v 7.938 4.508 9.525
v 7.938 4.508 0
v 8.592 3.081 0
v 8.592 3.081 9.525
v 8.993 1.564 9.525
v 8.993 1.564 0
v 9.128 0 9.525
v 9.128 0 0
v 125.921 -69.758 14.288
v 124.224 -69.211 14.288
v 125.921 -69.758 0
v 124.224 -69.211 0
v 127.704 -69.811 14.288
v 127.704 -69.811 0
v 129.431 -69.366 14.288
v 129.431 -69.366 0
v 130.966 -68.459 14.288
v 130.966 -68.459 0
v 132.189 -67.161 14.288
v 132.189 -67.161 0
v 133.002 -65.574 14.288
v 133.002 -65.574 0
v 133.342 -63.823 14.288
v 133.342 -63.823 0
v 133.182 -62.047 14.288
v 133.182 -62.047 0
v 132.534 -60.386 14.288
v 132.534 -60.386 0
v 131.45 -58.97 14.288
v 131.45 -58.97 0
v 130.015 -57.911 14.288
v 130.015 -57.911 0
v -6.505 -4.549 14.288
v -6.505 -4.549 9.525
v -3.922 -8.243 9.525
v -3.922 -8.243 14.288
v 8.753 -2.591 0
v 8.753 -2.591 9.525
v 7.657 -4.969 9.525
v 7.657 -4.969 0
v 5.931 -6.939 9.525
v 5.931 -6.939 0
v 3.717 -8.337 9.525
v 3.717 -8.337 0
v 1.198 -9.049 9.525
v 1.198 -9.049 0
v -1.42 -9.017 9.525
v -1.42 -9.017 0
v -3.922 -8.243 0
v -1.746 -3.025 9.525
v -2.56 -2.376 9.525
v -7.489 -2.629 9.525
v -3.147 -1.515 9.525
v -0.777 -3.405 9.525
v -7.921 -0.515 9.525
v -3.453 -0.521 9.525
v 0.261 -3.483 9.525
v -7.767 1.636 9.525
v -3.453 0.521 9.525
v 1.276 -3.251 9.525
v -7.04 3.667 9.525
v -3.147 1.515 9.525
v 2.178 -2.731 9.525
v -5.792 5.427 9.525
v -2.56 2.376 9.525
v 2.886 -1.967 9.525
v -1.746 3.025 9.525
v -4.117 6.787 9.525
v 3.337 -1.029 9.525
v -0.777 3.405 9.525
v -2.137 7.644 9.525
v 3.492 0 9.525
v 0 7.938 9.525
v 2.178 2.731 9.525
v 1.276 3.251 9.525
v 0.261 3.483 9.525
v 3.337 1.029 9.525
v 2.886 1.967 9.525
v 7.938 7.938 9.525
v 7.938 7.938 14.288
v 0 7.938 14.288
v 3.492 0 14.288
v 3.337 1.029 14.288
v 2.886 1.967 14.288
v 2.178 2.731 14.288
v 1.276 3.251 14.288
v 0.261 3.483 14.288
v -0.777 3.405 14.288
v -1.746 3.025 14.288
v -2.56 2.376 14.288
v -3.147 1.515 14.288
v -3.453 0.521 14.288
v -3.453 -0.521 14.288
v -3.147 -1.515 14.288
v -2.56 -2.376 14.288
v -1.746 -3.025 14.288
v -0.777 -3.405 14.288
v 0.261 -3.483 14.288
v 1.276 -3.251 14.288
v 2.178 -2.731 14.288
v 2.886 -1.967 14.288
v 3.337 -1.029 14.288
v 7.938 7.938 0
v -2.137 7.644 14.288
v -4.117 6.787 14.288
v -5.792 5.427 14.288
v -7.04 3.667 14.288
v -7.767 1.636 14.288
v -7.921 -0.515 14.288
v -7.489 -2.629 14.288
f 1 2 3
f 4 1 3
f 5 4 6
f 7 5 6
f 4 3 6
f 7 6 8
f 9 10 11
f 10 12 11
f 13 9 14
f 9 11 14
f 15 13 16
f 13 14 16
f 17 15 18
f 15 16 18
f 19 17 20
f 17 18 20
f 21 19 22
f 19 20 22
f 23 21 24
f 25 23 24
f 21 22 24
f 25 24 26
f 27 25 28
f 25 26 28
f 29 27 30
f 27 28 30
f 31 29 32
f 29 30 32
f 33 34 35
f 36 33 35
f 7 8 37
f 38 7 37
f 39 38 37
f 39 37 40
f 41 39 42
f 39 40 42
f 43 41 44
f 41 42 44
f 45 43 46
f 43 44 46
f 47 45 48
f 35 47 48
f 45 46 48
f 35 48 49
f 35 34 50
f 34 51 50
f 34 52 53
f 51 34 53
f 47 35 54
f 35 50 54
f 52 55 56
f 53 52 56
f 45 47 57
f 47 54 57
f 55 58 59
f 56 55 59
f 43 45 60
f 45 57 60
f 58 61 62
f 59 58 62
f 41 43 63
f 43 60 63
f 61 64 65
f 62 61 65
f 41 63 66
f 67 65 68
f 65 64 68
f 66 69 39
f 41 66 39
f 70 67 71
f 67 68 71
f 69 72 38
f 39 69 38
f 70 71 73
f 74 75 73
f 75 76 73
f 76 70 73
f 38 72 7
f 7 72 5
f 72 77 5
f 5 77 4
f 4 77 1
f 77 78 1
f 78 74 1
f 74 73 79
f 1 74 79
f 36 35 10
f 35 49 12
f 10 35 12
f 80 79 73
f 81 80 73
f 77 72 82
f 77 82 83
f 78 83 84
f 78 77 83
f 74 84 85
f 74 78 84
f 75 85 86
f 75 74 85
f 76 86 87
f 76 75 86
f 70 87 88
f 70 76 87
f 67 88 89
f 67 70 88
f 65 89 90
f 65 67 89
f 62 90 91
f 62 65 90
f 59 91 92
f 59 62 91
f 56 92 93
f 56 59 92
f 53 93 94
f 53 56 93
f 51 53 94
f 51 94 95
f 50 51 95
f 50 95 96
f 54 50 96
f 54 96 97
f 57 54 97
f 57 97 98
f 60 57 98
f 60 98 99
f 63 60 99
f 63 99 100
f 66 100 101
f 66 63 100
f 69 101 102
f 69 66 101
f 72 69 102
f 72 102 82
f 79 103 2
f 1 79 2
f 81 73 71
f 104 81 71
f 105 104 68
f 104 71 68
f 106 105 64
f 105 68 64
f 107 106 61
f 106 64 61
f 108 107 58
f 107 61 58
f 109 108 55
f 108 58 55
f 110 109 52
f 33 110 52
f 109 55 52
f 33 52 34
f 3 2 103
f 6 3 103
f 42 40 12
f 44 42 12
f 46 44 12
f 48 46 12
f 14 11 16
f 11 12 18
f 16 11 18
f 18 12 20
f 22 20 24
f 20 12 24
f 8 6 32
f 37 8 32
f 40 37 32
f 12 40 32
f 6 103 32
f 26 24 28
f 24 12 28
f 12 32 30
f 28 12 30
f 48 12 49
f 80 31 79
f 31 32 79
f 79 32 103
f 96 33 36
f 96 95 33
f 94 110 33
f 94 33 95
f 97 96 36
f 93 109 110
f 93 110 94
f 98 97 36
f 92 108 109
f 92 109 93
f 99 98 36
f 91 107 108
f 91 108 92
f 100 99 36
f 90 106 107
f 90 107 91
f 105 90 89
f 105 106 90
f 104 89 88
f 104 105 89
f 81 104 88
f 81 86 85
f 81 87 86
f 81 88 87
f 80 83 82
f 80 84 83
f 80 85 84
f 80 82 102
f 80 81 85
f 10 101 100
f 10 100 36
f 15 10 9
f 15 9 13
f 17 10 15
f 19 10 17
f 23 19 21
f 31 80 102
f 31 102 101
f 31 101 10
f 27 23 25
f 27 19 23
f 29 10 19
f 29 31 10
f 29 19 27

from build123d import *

# Parameters (mm, degrees)
F1_DEPTH = 9.525
F2_R     = 3.4925
F3_DEPTH = 4.7625
F5_DEPTH = 4.7625


with BuildPart() as f1:
    # F0 (on Top) → F1 (new body)
    with BuildSketch(Plane.XY):
        with BuildLine():
            Line((7.9375, 7.9375), (7.9375, 4.5076334995))
            ThreePointArc((7.9375, 4.5076334995), (8.8254506458, 2.3311128059), (9.128125, 0))
            ThreePointArc((9.128125, 0), (4.874681275, -7.7175221725), (-3.9216850064, -8.2427575923))
            Line((-3.9216850064, -8.2427575923), (124.223871162, -69.211007676))
            ThreePointArc((124.223871162, -69.211007676), (132.6511593099, -66.3960142358), (130.01461013, -57.9112053389))
            Line((130.01461013, -57.9112053389), (7.9375, 7.9375))
        make_face()
    extrude(amount=F1_DEPTH)

    # F2 (on face) → F3 (join)
    with BuildSketch(Plane.XY.offset(9.525)):
        with BuildLine():
            ThreePointArc((-6.5048555726, -4.5487097324), (2.3844931476, -7.5708717252), (7.9375, 0))
            ThreePointArc((7.9375, 0), (5.6126600757, 5.6126600757), (0, 7.9375))
            ThreePointArc((0, 7.9375), (-7.0395060107, 3.667323462), (-6.5048555726, -4.5487097324))
        make_face()
        Circle(F2_R, mode=Mode.SUBTRACT)
        with BuildLine():
            ThreePointArc((0, 7.9375), (5.6126600757, 5.6126600757), (7.9375, 0))
            ThreePointArc((7.9375, 0), (2.3844931476, -7.5708717252), (-6.5048555726, -4.5487097324))
            Line((-6.5048555726, -4.5487097324), (-3.9216850064, -8.2427575923))
            ThreePointArc((-3.9216850064, -8.2427575923), (6.6839218101, -6.2167399215), (7.9375, 4.5076334995))
            Line((7.9375, 4.5076334995), (7.9375, 7.9375))
            Line((7.9375, 7.9375), (0, 7.9375))
        make_face()
    extrude(amount=F3_DEPTH)

    # F4 (on face) → F5 (join)
    with BuildSketch(Plane.XY.offset(9.525)):
        with BuildLine():
            Line((-3.9216850064, -8.2427575923), (124.223871162, -69.211007676))
            ThreePointArc((124.223871162, -69.211007676), (132.6511593099, -66.3960142358), (130.01461013, -57.9112053389))
            Line((130.01461013, -57.9112053389), (7.9375, 7.9375))
            Line((7.9375, 7.9375), (7.9375, 4.5076334995))
            ThreePointArc((7.9375, 4.5076334995), (6.6839218101, -6.2167399215), (-3.9216850064, -8.2427575923))
        make_face()
    extrude(amount=F5_DEPTH)


solid = f1.part
